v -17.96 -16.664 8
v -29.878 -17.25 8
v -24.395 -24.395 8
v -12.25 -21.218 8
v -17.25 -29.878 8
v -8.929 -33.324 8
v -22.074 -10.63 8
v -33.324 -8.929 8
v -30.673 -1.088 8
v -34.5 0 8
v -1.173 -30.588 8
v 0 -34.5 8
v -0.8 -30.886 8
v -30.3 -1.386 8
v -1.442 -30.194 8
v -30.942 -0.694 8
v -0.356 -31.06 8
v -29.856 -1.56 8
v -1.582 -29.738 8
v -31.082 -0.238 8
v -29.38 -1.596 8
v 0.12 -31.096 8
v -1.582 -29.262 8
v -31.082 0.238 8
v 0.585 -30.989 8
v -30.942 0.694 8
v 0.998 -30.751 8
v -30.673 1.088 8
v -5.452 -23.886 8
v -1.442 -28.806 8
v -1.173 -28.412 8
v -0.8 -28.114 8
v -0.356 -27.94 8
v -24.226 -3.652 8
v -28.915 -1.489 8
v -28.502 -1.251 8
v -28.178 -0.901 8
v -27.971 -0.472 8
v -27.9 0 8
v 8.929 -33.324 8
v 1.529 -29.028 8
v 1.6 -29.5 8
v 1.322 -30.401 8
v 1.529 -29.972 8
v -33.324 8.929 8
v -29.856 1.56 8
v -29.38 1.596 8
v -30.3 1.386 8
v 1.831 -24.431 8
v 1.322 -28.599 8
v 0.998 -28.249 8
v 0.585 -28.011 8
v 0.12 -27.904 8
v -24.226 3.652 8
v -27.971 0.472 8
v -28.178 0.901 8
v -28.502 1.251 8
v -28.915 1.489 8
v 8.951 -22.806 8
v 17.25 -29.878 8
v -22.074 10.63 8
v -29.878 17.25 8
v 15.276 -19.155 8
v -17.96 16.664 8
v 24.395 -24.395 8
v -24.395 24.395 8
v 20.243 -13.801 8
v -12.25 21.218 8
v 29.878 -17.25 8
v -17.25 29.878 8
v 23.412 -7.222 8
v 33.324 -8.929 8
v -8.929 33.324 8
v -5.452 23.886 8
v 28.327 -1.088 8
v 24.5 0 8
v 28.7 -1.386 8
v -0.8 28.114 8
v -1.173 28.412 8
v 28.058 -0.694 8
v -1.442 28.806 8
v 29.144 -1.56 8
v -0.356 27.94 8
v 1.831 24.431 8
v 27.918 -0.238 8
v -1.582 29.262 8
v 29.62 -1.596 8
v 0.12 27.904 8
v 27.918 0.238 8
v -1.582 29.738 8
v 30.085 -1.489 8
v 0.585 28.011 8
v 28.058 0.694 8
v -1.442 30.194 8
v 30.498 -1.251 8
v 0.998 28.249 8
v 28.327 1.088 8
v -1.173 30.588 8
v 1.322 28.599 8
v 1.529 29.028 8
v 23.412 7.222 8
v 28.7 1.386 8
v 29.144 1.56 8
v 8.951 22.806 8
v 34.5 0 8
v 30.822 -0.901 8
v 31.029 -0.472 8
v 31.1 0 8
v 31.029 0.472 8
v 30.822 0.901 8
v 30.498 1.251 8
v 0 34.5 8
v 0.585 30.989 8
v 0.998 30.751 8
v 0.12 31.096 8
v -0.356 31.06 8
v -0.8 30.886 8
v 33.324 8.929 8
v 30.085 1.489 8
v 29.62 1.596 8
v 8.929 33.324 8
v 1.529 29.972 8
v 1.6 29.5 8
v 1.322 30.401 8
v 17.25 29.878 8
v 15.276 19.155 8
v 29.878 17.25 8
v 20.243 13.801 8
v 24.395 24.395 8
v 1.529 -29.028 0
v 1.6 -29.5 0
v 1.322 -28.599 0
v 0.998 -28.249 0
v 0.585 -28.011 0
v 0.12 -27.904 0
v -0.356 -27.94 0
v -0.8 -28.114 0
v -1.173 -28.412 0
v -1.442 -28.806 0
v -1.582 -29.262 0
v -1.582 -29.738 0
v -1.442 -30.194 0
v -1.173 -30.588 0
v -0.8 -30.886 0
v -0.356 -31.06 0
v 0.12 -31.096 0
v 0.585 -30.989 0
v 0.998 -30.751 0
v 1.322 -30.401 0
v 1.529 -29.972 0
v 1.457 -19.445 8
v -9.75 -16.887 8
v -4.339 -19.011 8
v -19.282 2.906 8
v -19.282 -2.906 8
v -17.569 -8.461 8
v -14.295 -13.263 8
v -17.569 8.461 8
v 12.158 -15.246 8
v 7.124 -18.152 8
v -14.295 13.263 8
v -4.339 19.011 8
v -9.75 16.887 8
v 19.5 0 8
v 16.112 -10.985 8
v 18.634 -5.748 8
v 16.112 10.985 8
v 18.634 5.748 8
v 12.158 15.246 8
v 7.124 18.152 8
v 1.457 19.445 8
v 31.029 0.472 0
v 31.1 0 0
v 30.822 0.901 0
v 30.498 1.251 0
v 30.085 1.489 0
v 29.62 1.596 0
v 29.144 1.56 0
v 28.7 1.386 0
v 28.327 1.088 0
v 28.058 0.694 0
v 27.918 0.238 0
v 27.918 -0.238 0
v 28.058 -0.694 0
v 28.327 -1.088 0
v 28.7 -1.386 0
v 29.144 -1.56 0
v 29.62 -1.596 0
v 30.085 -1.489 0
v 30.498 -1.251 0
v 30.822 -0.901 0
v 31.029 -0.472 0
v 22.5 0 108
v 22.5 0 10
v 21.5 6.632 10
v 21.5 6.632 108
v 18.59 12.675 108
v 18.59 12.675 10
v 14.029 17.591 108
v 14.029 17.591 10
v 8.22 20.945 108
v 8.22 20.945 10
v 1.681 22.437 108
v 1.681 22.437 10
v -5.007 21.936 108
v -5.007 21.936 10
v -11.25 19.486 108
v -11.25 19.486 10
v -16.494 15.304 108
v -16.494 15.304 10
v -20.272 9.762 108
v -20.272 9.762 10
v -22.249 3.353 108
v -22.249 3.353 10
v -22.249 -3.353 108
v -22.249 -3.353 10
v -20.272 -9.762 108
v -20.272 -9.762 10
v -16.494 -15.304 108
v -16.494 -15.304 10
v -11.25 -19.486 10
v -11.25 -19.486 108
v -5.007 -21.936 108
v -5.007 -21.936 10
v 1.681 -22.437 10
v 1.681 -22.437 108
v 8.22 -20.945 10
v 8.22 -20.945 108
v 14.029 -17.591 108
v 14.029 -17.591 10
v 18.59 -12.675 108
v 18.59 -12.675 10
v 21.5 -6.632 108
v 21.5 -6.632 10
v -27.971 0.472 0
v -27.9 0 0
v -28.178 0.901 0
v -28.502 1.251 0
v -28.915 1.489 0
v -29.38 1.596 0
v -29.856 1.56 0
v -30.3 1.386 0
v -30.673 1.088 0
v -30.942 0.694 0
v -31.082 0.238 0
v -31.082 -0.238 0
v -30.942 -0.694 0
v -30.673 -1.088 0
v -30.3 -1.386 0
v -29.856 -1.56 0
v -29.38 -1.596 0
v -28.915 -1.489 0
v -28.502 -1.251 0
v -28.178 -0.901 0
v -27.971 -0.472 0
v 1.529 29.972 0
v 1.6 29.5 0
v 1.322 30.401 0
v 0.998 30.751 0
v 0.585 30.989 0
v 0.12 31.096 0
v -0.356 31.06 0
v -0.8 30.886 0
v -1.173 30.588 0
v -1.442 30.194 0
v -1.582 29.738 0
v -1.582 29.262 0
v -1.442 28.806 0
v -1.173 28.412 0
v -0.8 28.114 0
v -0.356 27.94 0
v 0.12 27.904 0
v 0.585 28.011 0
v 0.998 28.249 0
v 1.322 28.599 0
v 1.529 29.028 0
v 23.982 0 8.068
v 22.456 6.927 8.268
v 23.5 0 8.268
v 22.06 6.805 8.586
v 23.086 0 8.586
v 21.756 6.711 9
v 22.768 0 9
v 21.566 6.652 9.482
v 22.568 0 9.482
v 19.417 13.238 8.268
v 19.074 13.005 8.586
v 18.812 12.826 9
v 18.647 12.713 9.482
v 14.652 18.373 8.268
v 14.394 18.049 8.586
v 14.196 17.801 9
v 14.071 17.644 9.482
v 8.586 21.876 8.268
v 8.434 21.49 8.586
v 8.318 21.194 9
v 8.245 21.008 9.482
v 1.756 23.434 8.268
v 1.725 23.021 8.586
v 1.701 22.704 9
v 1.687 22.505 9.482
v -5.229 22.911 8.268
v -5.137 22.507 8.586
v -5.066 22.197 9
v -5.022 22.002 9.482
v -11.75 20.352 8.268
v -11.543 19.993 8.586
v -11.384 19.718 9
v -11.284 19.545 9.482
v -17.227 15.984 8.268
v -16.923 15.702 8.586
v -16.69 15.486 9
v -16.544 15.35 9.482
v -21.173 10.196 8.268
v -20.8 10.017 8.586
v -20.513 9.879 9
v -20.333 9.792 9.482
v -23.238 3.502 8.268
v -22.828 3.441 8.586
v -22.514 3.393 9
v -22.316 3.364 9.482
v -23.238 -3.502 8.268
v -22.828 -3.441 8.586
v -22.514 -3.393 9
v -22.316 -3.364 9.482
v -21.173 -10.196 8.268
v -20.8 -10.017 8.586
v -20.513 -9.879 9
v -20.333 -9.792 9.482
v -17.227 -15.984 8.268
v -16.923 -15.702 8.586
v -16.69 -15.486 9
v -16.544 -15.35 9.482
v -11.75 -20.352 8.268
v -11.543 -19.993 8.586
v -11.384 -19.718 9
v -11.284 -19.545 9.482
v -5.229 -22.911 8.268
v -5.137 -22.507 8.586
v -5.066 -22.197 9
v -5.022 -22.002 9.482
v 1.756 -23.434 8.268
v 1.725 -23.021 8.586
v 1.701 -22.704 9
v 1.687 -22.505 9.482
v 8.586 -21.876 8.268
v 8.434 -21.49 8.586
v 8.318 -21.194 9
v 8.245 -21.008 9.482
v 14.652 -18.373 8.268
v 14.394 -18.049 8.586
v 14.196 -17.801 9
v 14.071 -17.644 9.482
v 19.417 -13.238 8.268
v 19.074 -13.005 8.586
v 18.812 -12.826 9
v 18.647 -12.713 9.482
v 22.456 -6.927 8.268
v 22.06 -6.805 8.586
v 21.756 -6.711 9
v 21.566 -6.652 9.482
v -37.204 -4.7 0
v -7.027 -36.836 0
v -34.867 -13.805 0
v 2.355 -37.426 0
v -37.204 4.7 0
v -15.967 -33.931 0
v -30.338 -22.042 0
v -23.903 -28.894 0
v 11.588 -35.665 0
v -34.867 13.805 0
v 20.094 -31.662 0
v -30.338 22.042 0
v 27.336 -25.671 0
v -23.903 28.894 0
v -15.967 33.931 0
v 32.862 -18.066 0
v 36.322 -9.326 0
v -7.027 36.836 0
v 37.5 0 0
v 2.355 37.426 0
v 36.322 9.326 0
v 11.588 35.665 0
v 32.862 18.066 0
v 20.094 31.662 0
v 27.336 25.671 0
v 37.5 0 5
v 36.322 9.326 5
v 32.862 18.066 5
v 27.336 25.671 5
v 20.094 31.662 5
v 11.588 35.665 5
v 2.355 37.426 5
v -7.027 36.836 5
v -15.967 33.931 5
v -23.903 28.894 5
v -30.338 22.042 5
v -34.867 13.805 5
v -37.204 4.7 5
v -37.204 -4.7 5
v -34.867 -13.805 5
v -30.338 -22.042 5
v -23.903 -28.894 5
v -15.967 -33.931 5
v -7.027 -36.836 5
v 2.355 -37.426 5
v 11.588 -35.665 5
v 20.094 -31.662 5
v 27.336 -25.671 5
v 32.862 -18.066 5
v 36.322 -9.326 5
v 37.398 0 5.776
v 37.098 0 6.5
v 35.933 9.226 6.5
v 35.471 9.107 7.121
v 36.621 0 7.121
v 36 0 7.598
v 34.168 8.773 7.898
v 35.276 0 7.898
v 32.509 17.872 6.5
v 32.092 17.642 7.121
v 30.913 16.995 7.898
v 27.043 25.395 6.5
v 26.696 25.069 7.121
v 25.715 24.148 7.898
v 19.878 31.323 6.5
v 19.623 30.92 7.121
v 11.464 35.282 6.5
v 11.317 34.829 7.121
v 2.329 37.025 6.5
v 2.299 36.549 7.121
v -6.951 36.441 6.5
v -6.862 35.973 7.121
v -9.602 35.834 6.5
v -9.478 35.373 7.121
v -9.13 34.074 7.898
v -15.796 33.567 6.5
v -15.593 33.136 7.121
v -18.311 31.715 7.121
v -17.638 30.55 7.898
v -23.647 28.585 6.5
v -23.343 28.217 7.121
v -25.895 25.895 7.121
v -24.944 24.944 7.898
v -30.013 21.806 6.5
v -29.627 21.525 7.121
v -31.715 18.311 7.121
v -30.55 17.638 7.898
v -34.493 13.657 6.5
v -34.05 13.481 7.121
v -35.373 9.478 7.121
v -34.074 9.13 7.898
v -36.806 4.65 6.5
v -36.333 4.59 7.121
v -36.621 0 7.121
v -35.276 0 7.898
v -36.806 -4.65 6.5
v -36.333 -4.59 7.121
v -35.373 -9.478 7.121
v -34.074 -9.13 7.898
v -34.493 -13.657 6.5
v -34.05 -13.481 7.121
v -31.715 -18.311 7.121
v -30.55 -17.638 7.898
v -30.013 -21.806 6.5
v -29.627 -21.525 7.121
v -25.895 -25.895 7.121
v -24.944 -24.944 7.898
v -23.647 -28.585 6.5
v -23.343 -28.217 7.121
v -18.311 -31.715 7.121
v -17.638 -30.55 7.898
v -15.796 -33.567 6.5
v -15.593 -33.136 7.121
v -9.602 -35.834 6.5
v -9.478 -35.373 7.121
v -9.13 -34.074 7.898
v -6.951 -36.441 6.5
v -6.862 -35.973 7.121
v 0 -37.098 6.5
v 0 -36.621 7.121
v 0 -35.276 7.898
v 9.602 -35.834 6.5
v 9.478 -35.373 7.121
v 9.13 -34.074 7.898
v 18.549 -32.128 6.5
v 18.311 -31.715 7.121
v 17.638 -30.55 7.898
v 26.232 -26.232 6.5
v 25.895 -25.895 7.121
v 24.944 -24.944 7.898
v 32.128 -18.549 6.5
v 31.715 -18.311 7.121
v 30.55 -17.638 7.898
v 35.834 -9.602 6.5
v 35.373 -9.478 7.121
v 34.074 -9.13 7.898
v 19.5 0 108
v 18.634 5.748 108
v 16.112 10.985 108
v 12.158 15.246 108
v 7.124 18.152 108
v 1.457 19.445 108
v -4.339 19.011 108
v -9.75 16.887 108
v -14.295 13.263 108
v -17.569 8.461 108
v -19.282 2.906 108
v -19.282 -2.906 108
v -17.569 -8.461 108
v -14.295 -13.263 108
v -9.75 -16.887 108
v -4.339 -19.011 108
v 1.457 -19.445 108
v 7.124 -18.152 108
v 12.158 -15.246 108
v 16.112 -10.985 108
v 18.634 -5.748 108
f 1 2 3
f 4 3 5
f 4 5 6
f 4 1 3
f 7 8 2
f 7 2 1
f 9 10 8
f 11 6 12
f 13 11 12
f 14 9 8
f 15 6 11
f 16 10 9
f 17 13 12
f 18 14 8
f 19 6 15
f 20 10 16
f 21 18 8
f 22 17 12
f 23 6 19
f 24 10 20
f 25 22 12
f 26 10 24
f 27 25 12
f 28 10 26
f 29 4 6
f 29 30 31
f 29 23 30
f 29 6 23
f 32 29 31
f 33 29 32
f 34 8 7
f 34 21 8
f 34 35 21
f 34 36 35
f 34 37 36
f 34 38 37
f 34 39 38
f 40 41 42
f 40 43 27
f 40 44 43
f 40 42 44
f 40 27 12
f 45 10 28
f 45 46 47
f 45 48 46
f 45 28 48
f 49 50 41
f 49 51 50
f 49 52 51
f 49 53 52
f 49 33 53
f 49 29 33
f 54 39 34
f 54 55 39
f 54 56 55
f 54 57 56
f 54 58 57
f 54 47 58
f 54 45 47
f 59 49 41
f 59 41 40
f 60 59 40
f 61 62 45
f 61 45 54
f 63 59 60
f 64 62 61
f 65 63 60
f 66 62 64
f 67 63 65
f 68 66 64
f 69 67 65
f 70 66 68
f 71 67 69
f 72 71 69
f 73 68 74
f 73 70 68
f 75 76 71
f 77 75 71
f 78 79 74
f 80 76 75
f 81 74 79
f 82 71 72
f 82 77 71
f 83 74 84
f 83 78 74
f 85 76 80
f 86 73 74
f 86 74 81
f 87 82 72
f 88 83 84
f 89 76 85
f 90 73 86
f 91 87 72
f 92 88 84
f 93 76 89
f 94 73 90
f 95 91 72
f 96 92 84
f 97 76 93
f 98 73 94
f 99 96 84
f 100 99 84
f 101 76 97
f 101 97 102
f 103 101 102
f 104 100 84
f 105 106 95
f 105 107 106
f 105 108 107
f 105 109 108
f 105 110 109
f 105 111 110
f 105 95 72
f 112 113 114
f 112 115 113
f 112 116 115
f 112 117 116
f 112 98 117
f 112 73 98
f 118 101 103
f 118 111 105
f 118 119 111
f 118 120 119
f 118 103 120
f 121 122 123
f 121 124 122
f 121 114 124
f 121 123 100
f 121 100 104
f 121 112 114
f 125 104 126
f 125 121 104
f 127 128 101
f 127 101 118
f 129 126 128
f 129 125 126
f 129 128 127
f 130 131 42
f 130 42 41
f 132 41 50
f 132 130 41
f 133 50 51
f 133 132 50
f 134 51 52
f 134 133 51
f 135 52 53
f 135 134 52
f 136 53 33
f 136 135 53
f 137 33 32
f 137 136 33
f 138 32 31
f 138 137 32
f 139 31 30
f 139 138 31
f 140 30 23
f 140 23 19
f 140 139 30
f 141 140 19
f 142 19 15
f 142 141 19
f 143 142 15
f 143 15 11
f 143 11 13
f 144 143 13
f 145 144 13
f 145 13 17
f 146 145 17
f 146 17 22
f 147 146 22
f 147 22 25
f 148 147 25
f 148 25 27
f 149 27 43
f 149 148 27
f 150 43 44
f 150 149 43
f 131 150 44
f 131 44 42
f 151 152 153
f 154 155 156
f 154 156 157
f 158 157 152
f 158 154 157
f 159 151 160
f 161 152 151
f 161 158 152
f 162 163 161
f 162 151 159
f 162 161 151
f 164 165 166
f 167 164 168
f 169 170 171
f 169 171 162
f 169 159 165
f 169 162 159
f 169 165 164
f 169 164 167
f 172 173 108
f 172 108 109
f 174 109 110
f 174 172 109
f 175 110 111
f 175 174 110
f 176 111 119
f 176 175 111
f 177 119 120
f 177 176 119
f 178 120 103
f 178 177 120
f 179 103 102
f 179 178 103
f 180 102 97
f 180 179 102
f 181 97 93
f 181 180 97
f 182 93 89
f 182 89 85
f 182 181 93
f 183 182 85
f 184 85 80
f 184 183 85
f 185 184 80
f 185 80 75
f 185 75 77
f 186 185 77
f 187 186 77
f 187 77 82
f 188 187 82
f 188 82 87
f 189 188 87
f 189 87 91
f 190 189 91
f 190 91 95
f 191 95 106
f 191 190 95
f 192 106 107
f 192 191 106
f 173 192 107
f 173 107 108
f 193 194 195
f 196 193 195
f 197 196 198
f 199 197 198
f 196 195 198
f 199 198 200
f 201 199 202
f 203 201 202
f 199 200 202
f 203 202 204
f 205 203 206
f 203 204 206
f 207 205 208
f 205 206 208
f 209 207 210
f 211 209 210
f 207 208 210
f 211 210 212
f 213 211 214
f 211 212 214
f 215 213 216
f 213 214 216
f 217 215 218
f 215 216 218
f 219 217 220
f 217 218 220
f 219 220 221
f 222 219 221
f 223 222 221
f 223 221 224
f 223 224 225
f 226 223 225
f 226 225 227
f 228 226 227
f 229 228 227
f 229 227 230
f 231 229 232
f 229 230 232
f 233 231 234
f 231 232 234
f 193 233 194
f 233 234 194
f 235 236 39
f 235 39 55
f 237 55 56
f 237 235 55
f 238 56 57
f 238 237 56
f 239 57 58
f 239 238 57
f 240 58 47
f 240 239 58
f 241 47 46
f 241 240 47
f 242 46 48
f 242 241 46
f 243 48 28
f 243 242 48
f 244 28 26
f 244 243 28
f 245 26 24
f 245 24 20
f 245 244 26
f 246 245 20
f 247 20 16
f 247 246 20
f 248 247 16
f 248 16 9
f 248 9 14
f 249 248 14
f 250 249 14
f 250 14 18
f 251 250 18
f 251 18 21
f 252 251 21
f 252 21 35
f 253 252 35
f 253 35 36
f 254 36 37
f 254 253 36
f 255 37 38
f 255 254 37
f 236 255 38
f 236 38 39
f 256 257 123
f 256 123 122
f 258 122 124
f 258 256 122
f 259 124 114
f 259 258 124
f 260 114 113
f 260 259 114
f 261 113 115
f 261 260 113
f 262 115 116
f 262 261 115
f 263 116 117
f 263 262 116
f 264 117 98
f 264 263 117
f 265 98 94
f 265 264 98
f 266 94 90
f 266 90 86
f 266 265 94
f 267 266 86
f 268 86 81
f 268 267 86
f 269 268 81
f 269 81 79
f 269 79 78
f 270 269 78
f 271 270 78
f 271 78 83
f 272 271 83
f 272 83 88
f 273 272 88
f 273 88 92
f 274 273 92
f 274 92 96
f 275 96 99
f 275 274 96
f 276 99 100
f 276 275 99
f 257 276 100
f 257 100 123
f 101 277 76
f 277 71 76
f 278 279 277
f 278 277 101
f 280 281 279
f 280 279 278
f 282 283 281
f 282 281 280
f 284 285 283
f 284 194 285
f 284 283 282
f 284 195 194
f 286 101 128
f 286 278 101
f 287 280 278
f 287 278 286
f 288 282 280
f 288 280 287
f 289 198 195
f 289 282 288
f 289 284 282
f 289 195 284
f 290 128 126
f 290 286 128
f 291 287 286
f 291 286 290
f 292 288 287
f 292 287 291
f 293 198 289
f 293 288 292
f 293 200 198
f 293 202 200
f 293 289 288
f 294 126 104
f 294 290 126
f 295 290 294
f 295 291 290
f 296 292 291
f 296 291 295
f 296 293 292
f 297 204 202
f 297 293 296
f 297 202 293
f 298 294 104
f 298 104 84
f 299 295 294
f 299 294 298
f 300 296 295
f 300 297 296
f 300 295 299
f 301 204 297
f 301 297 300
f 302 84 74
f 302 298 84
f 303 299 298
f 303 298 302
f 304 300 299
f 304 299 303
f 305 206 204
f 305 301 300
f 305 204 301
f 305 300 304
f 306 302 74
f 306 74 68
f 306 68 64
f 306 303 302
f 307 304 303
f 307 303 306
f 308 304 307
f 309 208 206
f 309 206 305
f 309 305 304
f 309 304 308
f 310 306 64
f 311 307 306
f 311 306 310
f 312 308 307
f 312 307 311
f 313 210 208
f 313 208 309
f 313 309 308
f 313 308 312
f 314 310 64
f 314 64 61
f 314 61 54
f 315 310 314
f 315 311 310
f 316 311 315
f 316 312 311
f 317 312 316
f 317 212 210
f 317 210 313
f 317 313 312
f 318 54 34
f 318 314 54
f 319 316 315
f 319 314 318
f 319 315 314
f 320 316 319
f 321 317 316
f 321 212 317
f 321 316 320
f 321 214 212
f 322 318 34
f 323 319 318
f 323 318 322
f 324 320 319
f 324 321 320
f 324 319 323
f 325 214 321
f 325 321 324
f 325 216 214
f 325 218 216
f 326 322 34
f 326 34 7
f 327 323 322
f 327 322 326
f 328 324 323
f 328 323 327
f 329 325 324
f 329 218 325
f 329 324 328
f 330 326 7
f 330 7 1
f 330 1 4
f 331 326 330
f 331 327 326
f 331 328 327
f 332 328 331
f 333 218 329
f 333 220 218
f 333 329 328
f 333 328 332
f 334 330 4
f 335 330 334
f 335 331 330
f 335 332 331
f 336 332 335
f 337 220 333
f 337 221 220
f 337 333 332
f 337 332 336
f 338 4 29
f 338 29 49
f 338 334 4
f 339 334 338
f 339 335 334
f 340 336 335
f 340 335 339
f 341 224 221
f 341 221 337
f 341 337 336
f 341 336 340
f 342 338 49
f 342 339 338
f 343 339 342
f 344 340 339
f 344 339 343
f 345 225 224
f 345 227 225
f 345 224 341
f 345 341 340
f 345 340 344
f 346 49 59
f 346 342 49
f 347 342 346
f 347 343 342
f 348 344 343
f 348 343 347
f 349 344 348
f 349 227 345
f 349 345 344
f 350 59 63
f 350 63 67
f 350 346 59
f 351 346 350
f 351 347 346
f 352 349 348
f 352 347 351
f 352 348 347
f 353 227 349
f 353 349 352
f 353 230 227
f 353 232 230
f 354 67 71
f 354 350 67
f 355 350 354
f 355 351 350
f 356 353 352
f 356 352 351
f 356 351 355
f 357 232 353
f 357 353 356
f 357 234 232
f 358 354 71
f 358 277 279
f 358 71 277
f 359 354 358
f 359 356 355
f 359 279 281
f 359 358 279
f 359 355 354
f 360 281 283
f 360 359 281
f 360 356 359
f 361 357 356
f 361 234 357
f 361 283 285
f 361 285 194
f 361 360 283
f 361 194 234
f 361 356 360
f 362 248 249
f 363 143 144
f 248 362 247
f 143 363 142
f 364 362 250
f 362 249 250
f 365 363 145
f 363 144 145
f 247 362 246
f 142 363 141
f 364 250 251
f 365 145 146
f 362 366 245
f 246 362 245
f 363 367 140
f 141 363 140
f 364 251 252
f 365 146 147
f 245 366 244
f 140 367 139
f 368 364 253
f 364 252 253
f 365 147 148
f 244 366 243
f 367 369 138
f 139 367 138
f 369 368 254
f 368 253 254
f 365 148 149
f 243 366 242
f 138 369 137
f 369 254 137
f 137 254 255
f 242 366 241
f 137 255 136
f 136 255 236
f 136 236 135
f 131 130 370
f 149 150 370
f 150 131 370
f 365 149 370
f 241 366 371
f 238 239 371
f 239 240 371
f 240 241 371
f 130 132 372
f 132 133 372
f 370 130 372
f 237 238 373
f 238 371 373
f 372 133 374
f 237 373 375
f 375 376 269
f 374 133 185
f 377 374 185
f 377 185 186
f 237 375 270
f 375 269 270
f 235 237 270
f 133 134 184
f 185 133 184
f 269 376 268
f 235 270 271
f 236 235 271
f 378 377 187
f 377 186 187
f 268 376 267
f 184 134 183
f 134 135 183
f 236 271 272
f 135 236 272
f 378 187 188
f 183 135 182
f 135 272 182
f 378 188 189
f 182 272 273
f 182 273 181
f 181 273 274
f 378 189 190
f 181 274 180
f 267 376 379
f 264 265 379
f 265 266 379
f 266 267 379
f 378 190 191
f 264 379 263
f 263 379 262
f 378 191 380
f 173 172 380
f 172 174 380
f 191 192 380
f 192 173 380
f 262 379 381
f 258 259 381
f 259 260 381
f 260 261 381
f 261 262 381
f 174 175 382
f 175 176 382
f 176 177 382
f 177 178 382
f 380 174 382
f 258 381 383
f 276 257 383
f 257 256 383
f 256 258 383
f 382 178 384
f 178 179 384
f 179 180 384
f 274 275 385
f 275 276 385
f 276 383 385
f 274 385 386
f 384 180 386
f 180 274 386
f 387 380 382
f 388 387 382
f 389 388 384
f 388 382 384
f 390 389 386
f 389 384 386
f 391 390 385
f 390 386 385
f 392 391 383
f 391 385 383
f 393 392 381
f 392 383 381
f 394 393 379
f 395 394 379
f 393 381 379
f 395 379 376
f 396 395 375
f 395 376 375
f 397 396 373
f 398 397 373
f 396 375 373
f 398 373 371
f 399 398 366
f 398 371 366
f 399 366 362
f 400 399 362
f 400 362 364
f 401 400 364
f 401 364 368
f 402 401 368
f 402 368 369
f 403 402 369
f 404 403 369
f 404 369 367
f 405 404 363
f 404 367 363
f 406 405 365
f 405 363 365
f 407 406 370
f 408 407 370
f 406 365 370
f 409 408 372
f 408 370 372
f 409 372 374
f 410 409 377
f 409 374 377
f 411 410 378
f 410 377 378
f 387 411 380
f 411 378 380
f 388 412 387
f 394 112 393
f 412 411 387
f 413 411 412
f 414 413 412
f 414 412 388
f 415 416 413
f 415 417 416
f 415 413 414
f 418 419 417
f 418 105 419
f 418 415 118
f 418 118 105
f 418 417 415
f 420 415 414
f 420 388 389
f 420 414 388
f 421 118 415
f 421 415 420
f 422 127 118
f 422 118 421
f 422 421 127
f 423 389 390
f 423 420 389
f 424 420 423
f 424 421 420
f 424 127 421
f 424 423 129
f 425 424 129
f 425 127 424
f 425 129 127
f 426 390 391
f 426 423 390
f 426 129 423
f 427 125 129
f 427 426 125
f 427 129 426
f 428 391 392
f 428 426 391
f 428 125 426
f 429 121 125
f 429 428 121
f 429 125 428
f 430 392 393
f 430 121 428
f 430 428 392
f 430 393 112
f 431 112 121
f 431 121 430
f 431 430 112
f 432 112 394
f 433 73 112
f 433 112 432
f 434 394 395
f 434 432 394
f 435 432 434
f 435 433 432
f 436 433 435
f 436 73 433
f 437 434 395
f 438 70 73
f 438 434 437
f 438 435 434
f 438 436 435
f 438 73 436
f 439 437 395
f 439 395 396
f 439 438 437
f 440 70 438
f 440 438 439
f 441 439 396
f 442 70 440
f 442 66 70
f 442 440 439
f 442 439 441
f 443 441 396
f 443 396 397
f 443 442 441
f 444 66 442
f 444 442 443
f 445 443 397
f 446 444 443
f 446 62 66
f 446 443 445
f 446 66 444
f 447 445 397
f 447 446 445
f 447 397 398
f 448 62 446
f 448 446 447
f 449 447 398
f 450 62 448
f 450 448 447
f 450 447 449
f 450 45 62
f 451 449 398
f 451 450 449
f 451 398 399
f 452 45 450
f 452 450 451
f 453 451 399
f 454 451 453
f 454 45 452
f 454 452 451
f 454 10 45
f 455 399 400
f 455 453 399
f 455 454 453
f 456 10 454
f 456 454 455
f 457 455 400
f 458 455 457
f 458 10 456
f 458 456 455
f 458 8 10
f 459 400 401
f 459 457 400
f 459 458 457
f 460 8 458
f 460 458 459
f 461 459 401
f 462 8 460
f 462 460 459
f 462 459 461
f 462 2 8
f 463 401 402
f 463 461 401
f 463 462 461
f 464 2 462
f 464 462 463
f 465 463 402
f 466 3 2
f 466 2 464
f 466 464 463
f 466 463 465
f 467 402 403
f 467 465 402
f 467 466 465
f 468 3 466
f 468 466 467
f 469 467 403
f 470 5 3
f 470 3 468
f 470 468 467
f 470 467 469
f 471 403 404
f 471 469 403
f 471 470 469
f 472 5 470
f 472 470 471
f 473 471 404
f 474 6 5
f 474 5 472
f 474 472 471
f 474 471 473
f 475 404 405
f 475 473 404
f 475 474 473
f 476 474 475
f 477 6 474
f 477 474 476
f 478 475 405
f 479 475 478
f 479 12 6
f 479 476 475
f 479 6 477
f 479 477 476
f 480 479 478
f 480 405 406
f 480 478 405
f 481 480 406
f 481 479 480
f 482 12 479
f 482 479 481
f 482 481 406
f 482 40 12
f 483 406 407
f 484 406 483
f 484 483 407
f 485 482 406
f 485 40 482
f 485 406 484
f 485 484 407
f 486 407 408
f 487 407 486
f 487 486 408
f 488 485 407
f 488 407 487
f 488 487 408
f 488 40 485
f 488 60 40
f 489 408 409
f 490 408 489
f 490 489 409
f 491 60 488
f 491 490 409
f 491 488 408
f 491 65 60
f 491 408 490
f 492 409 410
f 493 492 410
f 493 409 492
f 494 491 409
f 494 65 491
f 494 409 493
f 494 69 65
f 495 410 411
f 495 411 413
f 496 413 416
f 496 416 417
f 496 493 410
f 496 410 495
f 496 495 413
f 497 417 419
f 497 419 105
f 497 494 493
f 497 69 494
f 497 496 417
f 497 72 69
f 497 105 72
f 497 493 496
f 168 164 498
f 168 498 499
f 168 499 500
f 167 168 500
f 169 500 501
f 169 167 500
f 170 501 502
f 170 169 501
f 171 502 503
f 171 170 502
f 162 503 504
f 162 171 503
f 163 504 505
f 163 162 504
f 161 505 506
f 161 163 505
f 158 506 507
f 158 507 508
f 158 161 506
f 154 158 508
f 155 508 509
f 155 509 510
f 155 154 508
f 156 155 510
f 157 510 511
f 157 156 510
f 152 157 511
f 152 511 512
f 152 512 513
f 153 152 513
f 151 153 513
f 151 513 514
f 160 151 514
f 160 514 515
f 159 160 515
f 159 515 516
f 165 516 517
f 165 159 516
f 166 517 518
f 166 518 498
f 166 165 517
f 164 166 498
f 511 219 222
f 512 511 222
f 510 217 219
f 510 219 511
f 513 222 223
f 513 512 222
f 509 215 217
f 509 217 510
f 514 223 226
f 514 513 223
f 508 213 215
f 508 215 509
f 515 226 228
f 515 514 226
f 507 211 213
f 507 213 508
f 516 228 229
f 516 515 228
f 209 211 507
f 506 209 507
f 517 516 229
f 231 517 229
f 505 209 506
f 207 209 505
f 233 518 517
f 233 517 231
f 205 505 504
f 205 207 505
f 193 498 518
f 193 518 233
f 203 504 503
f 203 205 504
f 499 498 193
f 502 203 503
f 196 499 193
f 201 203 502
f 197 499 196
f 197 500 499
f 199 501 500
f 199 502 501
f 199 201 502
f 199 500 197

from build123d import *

# Parameters (mm, degrees)
SZKIC1_R                    = 37.5
SZKIC1_R_2                  = 1.6
DODANIE_WYCI_GNI_CIE1_DEPTH = 8
ZAOKR_GLENIE1_R             = 3
SZKIC2_R                    = 22.5
SZKIC2_R_2                  = 19.5
DODANIE_WYCI_GNI_CIE2_DEPTH = 100
ZAOKR_GLENIE2_R             = 2


with BuildPart() as part:
    # Szkic1 → Dodanie-wyciągnięcie1 (new body)
    with BuildSketch(Plane.XY):
        Circle(SZKIC1_R)
        with Locations((0, 29.5)):
            Circle(SZKIC1_R_2, mode=Mode.SUBTRACT)
        with Locations((29.5, 0)):
            Circle(SZKIC1_R_2, mode=Mode.SUBTRACT)
        with Locations((0, -29.5)):
            Circle(SZKIC1_R_2, mode=Mode.SUBTRACT)
        with Locations((-29.5, 0)):
            Circle(SZKIC1_R_2, mode=Mode.SUBTRACT)
    extrude(amount=DODANIE_WYCI_GNI_CIE1_DEPTH)

    # Zaokrąglenie1
    zaokr_glenie1_edges = [part.edges().sort_by_distance(p)[0] for p in [
        (-37.5, 0, 8),
    ]]
    fillet(zaokr_glenie1_edges, radius=ZAOKR_GLENIE1_R)

    # Szkic2 → Dodanie-wyciągnięcie2 (add)
    with BuildSketch(Plane.XY.offset(8)):
        Circle(SZKIC2_R)
        Circle(SZKIC2_R_2, mode=Mode.SUBTRACT)
    extrude(amount=DODANIE_WYCI_GNI_CIE2_DEPTH)

    # Zaokrąglenie2
    zaokr_glenie2_edges = [part.edges().sort_by_distance(p)[0] for p in [
        (-22.5, 0, 8),
    ]]
    fillet(zaokr_glenie2_edges, radius=ZAOKR_GLENIE2_R)


solid = part.part
